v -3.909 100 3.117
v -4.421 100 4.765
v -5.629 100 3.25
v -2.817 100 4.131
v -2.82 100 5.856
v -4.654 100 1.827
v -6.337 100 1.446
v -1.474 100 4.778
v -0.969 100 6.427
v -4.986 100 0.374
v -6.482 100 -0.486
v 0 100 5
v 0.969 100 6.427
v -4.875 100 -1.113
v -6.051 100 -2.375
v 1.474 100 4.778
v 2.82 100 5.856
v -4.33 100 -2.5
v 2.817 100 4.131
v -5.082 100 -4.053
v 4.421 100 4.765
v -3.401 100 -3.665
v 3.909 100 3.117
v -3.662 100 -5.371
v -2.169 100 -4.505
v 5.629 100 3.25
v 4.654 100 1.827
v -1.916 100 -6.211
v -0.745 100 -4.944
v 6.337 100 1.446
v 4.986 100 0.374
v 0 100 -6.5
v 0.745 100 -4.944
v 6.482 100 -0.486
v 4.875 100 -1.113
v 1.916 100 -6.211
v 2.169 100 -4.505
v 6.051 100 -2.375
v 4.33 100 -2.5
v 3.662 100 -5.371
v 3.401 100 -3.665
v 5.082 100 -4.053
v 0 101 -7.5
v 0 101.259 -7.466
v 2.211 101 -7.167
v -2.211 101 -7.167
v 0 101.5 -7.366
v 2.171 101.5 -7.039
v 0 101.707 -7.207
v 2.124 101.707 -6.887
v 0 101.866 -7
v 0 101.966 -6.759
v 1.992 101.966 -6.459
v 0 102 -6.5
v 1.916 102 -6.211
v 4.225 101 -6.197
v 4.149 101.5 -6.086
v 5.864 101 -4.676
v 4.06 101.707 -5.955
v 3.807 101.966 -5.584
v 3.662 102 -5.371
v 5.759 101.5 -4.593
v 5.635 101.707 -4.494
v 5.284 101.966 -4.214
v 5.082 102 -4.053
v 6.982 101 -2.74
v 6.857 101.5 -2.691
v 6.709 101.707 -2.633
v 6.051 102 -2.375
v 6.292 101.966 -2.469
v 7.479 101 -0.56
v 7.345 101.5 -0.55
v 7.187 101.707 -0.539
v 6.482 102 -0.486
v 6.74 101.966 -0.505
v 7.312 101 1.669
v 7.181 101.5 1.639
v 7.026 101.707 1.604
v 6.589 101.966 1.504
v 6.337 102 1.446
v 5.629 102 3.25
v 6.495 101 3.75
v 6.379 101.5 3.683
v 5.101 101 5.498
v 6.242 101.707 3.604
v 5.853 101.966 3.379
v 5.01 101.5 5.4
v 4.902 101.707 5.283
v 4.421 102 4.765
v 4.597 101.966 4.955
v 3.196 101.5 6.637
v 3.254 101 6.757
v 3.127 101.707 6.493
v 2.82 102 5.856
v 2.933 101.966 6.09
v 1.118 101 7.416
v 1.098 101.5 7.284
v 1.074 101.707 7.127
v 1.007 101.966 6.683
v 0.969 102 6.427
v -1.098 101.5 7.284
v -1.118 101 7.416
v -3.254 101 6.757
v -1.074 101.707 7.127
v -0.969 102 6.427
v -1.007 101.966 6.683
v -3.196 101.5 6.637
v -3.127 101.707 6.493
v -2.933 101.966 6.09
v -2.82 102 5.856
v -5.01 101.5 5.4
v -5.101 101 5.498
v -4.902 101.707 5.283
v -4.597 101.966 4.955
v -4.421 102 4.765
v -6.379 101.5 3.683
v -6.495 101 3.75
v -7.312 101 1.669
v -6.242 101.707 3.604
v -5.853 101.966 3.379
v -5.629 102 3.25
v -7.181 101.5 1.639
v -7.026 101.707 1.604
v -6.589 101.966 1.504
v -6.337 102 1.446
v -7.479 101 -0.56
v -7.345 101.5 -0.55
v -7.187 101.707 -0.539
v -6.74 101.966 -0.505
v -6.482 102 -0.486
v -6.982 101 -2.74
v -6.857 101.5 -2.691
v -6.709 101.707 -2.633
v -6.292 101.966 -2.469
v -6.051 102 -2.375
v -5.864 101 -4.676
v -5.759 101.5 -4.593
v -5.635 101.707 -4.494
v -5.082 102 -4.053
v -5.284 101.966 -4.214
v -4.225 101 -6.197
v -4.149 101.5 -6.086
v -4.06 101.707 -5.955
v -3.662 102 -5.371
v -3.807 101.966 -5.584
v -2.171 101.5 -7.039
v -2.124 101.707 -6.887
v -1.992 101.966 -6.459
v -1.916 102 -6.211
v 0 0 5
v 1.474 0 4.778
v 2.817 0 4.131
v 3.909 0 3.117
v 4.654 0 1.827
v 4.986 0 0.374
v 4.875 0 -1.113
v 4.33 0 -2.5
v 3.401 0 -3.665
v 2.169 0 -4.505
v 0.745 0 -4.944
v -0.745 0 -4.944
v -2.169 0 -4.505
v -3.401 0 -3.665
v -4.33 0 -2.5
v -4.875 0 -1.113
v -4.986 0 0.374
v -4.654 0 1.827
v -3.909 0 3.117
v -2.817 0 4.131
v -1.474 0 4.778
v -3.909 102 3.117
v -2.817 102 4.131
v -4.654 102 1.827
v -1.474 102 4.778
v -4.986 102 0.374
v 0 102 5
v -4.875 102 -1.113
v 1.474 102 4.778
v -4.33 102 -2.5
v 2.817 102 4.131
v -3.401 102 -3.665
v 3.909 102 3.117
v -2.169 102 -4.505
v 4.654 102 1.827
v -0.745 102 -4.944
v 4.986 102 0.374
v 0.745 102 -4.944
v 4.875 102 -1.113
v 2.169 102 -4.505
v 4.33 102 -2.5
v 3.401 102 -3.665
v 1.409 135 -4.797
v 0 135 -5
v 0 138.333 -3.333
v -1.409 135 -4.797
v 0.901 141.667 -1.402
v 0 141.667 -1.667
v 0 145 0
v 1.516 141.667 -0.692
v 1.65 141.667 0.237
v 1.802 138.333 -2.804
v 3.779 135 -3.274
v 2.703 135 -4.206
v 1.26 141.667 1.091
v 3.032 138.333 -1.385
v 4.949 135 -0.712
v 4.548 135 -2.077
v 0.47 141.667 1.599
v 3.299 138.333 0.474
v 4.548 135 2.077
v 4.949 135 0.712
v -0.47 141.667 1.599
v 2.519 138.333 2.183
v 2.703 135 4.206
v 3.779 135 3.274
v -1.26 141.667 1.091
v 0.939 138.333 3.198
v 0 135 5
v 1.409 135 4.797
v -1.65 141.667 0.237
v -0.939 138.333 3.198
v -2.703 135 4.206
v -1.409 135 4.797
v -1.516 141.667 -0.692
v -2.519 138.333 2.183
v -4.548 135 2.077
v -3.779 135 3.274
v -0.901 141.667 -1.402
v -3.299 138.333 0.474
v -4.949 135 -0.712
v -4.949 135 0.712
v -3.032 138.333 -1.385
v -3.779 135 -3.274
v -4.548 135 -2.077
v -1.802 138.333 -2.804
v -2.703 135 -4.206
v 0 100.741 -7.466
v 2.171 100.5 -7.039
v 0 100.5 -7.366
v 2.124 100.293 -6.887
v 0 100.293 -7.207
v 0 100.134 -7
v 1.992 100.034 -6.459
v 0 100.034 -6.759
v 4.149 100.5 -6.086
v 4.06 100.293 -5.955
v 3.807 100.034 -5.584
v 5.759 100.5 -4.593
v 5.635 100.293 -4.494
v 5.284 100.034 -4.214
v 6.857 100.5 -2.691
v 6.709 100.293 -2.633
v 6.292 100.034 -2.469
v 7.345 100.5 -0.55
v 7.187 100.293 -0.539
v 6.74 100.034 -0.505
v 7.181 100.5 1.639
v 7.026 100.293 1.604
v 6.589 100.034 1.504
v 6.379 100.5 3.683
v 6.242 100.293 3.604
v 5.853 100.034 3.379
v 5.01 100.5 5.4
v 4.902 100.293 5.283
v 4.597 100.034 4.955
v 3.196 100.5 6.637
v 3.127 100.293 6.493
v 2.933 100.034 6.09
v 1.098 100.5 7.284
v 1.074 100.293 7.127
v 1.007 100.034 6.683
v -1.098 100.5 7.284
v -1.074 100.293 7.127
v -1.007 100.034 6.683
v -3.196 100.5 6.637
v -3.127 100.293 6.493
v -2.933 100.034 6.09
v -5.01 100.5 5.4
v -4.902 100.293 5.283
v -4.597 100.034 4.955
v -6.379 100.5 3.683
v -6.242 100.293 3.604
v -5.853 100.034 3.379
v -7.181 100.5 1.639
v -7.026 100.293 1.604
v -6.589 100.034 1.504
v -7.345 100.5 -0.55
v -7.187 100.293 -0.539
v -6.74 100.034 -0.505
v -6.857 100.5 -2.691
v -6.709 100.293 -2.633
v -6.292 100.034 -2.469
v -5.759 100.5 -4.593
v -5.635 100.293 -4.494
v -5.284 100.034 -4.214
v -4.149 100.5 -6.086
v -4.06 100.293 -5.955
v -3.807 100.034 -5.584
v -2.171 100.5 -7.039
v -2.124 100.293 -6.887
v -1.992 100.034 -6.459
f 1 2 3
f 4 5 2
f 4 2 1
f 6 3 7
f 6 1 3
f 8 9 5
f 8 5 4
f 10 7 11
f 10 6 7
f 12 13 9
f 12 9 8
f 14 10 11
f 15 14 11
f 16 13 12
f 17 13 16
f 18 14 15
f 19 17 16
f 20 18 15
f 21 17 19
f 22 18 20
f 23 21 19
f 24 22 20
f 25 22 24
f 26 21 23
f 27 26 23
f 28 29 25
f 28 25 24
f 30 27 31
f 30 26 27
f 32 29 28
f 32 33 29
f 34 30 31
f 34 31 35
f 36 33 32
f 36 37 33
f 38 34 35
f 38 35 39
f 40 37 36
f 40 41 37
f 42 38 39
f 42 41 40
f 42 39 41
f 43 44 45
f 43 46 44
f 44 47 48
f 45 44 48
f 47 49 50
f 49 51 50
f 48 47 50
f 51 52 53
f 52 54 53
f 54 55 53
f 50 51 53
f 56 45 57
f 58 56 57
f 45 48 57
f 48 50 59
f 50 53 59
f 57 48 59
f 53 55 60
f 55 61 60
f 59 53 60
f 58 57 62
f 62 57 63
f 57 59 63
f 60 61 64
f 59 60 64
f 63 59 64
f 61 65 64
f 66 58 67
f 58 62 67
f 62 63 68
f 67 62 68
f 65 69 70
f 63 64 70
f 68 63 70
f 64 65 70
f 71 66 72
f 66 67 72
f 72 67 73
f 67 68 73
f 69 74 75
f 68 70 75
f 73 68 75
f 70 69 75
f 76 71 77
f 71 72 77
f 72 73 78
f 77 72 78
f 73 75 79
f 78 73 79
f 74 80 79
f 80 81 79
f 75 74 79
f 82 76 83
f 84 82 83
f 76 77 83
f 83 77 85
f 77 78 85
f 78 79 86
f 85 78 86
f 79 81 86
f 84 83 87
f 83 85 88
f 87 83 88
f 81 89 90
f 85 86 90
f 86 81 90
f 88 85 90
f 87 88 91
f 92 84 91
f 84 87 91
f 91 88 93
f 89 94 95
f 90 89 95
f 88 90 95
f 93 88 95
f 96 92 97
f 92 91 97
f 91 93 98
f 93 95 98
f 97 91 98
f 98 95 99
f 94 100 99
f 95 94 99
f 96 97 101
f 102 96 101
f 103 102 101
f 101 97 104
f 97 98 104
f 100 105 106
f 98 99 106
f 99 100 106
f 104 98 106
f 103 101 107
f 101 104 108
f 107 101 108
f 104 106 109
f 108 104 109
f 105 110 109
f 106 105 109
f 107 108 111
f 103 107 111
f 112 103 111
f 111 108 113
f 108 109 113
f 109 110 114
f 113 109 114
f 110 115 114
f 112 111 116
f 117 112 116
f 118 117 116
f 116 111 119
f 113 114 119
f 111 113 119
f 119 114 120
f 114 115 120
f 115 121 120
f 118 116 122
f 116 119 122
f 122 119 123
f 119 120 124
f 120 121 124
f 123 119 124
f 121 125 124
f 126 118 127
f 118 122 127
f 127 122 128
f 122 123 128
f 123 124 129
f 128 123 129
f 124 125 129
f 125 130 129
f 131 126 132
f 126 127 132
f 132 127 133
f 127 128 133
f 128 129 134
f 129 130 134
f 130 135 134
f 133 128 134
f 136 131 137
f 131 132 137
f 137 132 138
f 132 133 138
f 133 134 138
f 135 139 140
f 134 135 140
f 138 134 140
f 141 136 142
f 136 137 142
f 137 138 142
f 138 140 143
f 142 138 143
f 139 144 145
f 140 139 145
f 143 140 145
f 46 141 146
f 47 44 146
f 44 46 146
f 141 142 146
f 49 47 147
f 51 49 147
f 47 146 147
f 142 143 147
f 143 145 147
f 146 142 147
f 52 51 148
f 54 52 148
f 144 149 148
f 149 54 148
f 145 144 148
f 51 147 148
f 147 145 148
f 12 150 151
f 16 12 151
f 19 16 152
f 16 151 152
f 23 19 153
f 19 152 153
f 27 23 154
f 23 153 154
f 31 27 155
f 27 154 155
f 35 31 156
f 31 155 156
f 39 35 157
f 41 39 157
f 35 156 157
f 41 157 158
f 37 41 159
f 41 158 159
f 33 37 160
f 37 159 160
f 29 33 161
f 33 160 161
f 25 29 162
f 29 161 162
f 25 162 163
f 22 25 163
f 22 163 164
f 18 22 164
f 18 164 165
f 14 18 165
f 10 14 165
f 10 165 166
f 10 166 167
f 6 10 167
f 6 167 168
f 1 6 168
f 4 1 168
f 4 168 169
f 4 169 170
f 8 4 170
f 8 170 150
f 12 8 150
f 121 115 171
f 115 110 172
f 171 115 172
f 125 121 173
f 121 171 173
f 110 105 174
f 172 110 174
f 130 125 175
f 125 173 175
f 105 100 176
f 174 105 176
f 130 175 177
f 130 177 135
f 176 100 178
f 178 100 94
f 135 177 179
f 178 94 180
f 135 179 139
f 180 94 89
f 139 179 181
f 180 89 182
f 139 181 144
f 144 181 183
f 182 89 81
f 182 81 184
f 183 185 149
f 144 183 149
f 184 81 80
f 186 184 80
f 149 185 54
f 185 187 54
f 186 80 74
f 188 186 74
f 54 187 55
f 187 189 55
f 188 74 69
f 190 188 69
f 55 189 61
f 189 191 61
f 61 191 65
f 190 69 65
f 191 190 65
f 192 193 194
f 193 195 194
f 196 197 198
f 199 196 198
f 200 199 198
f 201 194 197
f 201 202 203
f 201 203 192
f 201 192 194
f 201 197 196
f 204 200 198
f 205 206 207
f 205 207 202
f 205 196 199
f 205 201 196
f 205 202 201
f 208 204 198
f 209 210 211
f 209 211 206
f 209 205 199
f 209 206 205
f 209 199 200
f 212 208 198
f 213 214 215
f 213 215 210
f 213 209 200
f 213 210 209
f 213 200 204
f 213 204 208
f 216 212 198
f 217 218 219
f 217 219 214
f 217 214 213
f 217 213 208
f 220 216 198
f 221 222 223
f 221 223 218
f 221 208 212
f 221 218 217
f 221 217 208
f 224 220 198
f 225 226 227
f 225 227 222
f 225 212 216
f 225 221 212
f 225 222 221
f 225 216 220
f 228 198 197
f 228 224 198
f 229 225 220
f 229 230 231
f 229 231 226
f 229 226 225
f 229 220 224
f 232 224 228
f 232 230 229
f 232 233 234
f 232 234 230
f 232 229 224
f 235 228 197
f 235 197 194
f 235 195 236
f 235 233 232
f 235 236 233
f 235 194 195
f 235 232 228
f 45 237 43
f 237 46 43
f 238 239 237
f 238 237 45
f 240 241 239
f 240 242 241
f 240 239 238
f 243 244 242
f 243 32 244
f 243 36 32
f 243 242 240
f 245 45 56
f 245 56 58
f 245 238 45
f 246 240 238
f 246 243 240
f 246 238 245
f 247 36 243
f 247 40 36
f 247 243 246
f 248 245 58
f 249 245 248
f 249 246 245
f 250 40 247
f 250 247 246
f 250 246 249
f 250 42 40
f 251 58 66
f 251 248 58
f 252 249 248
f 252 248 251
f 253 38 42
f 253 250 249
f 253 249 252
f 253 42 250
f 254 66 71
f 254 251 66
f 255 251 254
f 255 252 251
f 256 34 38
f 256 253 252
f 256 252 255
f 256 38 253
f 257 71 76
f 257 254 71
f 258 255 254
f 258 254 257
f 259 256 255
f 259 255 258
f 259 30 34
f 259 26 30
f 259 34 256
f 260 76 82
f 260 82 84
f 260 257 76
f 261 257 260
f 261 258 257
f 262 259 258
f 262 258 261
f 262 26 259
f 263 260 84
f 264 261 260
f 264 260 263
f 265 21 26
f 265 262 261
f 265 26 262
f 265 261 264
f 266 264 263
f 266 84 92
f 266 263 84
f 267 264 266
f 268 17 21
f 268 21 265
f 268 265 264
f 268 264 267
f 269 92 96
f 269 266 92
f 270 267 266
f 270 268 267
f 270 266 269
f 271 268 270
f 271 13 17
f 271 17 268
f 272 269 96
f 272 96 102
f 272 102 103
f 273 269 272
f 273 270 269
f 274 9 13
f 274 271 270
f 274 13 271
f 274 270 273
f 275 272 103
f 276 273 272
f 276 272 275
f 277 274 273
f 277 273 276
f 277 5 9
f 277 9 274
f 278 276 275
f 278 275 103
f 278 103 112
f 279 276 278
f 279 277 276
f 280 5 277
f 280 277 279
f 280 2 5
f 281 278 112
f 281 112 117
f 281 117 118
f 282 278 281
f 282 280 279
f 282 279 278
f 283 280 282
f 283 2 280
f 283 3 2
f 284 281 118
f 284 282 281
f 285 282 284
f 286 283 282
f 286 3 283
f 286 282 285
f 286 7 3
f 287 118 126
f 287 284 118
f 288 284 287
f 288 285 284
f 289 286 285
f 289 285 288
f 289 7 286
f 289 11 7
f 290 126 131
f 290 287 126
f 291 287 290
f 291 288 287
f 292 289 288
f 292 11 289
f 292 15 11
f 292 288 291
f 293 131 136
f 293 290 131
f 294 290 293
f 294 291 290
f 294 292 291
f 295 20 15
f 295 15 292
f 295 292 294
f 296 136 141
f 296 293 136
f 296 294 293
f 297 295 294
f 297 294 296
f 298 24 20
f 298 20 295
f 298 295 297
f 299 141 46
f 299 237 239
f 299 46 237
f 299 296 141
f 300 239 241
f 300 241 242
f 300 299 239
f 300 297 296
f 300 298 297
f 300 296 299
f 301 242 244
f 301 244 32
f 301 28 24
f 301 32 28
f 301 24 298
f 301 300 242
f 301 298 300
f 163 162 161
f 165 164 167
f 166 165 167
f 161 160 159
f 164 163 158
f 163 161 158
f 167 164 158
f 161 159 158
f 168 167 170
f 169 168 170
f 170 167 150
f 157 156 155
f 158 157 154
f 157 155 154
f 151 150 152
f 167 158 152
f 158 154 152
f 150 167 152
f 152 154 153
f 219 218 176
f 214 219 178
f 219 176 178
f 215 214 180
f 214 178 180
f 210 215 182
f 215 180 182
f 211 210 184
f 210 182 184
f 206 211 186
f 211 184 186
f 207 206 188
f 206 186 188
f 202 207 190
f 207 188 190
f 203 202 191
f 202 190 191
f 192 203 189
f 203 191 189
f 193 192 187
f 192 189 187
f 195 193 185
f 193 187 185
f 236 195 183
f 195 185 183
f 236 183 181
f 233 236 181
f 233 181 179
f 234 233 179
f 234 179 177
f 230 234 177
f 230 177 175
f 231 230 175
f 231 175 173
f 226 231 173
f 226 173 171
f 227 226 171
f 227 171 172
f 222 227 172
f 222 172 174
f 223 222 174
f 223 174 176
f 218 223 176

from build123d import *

# Parameters (mm, degrees)
SKETCH1_R           = 5
BOSS_EXTRUDE1_DEPTH = 135
BOSS_EXTRUDE2_START = -100
SKETCH3_R           = 7.5
SKETCH3_R_2         = 5
BOSS_EXTRUDE2_DEPTH = 2
FILLET1_R           = 1


with BuildPart() as part:
    # Sketch1 → Boss-Extrude1 (new body)
    with BuildSketch(Plane(origin=(0, 0, 0), x_dir=(1, 0, 0), z_dir=(0, 1, 0))):
        with Locations(Location((0, 0, 0), (0, 0, 270))):
            Circle(SKETCH1_R)
    extrude(amount=BOSS_EXTRUDE1_DEPTH)

    # Sketch2 → Revolve3 (revolve)
    with BuildSketch(Plane.XY, mode=Mode.PRIVATE) as revolve3_sk:
        Polygon((0, 145), (5, 135), (0, 135), align=None)
    revolve(revolve3_sk.sketch.rotate(Axis((0, 135, 0), (0, -1, 0)), 270), axis=Axis((0, 135, 0), (0, -1, 0)))

    # Sketch3 → Boss-Extrude2 (add)
    with BuildSketch(Plane.XZ.offset(BOSS_EXTRUDE2_START)):
        with Locations(Location((0, 0, 0), (0, 0, 270))):
            Circle(SKETCH3_R)
        with Locations(Location((0, 0, 0), (0, 0, 270))):
            Circle(SKETCH3_R_2, mode=Mode.SUBTRACT)
    extrude(amount=-BOSS_EXTRUDE2_DEPTH)

    # Fillet1
    fillet1_edges = [part.edges().sort_by_distance(p)[0] for p in [
        (0, 100, 7.5),
        (0, 102, 7.5),
    ]]
    fillet(fillet1_edges, radius=FILLET1_R - 0.0001)  # a hair under: the kernel refuses the full size


solid = part.part
